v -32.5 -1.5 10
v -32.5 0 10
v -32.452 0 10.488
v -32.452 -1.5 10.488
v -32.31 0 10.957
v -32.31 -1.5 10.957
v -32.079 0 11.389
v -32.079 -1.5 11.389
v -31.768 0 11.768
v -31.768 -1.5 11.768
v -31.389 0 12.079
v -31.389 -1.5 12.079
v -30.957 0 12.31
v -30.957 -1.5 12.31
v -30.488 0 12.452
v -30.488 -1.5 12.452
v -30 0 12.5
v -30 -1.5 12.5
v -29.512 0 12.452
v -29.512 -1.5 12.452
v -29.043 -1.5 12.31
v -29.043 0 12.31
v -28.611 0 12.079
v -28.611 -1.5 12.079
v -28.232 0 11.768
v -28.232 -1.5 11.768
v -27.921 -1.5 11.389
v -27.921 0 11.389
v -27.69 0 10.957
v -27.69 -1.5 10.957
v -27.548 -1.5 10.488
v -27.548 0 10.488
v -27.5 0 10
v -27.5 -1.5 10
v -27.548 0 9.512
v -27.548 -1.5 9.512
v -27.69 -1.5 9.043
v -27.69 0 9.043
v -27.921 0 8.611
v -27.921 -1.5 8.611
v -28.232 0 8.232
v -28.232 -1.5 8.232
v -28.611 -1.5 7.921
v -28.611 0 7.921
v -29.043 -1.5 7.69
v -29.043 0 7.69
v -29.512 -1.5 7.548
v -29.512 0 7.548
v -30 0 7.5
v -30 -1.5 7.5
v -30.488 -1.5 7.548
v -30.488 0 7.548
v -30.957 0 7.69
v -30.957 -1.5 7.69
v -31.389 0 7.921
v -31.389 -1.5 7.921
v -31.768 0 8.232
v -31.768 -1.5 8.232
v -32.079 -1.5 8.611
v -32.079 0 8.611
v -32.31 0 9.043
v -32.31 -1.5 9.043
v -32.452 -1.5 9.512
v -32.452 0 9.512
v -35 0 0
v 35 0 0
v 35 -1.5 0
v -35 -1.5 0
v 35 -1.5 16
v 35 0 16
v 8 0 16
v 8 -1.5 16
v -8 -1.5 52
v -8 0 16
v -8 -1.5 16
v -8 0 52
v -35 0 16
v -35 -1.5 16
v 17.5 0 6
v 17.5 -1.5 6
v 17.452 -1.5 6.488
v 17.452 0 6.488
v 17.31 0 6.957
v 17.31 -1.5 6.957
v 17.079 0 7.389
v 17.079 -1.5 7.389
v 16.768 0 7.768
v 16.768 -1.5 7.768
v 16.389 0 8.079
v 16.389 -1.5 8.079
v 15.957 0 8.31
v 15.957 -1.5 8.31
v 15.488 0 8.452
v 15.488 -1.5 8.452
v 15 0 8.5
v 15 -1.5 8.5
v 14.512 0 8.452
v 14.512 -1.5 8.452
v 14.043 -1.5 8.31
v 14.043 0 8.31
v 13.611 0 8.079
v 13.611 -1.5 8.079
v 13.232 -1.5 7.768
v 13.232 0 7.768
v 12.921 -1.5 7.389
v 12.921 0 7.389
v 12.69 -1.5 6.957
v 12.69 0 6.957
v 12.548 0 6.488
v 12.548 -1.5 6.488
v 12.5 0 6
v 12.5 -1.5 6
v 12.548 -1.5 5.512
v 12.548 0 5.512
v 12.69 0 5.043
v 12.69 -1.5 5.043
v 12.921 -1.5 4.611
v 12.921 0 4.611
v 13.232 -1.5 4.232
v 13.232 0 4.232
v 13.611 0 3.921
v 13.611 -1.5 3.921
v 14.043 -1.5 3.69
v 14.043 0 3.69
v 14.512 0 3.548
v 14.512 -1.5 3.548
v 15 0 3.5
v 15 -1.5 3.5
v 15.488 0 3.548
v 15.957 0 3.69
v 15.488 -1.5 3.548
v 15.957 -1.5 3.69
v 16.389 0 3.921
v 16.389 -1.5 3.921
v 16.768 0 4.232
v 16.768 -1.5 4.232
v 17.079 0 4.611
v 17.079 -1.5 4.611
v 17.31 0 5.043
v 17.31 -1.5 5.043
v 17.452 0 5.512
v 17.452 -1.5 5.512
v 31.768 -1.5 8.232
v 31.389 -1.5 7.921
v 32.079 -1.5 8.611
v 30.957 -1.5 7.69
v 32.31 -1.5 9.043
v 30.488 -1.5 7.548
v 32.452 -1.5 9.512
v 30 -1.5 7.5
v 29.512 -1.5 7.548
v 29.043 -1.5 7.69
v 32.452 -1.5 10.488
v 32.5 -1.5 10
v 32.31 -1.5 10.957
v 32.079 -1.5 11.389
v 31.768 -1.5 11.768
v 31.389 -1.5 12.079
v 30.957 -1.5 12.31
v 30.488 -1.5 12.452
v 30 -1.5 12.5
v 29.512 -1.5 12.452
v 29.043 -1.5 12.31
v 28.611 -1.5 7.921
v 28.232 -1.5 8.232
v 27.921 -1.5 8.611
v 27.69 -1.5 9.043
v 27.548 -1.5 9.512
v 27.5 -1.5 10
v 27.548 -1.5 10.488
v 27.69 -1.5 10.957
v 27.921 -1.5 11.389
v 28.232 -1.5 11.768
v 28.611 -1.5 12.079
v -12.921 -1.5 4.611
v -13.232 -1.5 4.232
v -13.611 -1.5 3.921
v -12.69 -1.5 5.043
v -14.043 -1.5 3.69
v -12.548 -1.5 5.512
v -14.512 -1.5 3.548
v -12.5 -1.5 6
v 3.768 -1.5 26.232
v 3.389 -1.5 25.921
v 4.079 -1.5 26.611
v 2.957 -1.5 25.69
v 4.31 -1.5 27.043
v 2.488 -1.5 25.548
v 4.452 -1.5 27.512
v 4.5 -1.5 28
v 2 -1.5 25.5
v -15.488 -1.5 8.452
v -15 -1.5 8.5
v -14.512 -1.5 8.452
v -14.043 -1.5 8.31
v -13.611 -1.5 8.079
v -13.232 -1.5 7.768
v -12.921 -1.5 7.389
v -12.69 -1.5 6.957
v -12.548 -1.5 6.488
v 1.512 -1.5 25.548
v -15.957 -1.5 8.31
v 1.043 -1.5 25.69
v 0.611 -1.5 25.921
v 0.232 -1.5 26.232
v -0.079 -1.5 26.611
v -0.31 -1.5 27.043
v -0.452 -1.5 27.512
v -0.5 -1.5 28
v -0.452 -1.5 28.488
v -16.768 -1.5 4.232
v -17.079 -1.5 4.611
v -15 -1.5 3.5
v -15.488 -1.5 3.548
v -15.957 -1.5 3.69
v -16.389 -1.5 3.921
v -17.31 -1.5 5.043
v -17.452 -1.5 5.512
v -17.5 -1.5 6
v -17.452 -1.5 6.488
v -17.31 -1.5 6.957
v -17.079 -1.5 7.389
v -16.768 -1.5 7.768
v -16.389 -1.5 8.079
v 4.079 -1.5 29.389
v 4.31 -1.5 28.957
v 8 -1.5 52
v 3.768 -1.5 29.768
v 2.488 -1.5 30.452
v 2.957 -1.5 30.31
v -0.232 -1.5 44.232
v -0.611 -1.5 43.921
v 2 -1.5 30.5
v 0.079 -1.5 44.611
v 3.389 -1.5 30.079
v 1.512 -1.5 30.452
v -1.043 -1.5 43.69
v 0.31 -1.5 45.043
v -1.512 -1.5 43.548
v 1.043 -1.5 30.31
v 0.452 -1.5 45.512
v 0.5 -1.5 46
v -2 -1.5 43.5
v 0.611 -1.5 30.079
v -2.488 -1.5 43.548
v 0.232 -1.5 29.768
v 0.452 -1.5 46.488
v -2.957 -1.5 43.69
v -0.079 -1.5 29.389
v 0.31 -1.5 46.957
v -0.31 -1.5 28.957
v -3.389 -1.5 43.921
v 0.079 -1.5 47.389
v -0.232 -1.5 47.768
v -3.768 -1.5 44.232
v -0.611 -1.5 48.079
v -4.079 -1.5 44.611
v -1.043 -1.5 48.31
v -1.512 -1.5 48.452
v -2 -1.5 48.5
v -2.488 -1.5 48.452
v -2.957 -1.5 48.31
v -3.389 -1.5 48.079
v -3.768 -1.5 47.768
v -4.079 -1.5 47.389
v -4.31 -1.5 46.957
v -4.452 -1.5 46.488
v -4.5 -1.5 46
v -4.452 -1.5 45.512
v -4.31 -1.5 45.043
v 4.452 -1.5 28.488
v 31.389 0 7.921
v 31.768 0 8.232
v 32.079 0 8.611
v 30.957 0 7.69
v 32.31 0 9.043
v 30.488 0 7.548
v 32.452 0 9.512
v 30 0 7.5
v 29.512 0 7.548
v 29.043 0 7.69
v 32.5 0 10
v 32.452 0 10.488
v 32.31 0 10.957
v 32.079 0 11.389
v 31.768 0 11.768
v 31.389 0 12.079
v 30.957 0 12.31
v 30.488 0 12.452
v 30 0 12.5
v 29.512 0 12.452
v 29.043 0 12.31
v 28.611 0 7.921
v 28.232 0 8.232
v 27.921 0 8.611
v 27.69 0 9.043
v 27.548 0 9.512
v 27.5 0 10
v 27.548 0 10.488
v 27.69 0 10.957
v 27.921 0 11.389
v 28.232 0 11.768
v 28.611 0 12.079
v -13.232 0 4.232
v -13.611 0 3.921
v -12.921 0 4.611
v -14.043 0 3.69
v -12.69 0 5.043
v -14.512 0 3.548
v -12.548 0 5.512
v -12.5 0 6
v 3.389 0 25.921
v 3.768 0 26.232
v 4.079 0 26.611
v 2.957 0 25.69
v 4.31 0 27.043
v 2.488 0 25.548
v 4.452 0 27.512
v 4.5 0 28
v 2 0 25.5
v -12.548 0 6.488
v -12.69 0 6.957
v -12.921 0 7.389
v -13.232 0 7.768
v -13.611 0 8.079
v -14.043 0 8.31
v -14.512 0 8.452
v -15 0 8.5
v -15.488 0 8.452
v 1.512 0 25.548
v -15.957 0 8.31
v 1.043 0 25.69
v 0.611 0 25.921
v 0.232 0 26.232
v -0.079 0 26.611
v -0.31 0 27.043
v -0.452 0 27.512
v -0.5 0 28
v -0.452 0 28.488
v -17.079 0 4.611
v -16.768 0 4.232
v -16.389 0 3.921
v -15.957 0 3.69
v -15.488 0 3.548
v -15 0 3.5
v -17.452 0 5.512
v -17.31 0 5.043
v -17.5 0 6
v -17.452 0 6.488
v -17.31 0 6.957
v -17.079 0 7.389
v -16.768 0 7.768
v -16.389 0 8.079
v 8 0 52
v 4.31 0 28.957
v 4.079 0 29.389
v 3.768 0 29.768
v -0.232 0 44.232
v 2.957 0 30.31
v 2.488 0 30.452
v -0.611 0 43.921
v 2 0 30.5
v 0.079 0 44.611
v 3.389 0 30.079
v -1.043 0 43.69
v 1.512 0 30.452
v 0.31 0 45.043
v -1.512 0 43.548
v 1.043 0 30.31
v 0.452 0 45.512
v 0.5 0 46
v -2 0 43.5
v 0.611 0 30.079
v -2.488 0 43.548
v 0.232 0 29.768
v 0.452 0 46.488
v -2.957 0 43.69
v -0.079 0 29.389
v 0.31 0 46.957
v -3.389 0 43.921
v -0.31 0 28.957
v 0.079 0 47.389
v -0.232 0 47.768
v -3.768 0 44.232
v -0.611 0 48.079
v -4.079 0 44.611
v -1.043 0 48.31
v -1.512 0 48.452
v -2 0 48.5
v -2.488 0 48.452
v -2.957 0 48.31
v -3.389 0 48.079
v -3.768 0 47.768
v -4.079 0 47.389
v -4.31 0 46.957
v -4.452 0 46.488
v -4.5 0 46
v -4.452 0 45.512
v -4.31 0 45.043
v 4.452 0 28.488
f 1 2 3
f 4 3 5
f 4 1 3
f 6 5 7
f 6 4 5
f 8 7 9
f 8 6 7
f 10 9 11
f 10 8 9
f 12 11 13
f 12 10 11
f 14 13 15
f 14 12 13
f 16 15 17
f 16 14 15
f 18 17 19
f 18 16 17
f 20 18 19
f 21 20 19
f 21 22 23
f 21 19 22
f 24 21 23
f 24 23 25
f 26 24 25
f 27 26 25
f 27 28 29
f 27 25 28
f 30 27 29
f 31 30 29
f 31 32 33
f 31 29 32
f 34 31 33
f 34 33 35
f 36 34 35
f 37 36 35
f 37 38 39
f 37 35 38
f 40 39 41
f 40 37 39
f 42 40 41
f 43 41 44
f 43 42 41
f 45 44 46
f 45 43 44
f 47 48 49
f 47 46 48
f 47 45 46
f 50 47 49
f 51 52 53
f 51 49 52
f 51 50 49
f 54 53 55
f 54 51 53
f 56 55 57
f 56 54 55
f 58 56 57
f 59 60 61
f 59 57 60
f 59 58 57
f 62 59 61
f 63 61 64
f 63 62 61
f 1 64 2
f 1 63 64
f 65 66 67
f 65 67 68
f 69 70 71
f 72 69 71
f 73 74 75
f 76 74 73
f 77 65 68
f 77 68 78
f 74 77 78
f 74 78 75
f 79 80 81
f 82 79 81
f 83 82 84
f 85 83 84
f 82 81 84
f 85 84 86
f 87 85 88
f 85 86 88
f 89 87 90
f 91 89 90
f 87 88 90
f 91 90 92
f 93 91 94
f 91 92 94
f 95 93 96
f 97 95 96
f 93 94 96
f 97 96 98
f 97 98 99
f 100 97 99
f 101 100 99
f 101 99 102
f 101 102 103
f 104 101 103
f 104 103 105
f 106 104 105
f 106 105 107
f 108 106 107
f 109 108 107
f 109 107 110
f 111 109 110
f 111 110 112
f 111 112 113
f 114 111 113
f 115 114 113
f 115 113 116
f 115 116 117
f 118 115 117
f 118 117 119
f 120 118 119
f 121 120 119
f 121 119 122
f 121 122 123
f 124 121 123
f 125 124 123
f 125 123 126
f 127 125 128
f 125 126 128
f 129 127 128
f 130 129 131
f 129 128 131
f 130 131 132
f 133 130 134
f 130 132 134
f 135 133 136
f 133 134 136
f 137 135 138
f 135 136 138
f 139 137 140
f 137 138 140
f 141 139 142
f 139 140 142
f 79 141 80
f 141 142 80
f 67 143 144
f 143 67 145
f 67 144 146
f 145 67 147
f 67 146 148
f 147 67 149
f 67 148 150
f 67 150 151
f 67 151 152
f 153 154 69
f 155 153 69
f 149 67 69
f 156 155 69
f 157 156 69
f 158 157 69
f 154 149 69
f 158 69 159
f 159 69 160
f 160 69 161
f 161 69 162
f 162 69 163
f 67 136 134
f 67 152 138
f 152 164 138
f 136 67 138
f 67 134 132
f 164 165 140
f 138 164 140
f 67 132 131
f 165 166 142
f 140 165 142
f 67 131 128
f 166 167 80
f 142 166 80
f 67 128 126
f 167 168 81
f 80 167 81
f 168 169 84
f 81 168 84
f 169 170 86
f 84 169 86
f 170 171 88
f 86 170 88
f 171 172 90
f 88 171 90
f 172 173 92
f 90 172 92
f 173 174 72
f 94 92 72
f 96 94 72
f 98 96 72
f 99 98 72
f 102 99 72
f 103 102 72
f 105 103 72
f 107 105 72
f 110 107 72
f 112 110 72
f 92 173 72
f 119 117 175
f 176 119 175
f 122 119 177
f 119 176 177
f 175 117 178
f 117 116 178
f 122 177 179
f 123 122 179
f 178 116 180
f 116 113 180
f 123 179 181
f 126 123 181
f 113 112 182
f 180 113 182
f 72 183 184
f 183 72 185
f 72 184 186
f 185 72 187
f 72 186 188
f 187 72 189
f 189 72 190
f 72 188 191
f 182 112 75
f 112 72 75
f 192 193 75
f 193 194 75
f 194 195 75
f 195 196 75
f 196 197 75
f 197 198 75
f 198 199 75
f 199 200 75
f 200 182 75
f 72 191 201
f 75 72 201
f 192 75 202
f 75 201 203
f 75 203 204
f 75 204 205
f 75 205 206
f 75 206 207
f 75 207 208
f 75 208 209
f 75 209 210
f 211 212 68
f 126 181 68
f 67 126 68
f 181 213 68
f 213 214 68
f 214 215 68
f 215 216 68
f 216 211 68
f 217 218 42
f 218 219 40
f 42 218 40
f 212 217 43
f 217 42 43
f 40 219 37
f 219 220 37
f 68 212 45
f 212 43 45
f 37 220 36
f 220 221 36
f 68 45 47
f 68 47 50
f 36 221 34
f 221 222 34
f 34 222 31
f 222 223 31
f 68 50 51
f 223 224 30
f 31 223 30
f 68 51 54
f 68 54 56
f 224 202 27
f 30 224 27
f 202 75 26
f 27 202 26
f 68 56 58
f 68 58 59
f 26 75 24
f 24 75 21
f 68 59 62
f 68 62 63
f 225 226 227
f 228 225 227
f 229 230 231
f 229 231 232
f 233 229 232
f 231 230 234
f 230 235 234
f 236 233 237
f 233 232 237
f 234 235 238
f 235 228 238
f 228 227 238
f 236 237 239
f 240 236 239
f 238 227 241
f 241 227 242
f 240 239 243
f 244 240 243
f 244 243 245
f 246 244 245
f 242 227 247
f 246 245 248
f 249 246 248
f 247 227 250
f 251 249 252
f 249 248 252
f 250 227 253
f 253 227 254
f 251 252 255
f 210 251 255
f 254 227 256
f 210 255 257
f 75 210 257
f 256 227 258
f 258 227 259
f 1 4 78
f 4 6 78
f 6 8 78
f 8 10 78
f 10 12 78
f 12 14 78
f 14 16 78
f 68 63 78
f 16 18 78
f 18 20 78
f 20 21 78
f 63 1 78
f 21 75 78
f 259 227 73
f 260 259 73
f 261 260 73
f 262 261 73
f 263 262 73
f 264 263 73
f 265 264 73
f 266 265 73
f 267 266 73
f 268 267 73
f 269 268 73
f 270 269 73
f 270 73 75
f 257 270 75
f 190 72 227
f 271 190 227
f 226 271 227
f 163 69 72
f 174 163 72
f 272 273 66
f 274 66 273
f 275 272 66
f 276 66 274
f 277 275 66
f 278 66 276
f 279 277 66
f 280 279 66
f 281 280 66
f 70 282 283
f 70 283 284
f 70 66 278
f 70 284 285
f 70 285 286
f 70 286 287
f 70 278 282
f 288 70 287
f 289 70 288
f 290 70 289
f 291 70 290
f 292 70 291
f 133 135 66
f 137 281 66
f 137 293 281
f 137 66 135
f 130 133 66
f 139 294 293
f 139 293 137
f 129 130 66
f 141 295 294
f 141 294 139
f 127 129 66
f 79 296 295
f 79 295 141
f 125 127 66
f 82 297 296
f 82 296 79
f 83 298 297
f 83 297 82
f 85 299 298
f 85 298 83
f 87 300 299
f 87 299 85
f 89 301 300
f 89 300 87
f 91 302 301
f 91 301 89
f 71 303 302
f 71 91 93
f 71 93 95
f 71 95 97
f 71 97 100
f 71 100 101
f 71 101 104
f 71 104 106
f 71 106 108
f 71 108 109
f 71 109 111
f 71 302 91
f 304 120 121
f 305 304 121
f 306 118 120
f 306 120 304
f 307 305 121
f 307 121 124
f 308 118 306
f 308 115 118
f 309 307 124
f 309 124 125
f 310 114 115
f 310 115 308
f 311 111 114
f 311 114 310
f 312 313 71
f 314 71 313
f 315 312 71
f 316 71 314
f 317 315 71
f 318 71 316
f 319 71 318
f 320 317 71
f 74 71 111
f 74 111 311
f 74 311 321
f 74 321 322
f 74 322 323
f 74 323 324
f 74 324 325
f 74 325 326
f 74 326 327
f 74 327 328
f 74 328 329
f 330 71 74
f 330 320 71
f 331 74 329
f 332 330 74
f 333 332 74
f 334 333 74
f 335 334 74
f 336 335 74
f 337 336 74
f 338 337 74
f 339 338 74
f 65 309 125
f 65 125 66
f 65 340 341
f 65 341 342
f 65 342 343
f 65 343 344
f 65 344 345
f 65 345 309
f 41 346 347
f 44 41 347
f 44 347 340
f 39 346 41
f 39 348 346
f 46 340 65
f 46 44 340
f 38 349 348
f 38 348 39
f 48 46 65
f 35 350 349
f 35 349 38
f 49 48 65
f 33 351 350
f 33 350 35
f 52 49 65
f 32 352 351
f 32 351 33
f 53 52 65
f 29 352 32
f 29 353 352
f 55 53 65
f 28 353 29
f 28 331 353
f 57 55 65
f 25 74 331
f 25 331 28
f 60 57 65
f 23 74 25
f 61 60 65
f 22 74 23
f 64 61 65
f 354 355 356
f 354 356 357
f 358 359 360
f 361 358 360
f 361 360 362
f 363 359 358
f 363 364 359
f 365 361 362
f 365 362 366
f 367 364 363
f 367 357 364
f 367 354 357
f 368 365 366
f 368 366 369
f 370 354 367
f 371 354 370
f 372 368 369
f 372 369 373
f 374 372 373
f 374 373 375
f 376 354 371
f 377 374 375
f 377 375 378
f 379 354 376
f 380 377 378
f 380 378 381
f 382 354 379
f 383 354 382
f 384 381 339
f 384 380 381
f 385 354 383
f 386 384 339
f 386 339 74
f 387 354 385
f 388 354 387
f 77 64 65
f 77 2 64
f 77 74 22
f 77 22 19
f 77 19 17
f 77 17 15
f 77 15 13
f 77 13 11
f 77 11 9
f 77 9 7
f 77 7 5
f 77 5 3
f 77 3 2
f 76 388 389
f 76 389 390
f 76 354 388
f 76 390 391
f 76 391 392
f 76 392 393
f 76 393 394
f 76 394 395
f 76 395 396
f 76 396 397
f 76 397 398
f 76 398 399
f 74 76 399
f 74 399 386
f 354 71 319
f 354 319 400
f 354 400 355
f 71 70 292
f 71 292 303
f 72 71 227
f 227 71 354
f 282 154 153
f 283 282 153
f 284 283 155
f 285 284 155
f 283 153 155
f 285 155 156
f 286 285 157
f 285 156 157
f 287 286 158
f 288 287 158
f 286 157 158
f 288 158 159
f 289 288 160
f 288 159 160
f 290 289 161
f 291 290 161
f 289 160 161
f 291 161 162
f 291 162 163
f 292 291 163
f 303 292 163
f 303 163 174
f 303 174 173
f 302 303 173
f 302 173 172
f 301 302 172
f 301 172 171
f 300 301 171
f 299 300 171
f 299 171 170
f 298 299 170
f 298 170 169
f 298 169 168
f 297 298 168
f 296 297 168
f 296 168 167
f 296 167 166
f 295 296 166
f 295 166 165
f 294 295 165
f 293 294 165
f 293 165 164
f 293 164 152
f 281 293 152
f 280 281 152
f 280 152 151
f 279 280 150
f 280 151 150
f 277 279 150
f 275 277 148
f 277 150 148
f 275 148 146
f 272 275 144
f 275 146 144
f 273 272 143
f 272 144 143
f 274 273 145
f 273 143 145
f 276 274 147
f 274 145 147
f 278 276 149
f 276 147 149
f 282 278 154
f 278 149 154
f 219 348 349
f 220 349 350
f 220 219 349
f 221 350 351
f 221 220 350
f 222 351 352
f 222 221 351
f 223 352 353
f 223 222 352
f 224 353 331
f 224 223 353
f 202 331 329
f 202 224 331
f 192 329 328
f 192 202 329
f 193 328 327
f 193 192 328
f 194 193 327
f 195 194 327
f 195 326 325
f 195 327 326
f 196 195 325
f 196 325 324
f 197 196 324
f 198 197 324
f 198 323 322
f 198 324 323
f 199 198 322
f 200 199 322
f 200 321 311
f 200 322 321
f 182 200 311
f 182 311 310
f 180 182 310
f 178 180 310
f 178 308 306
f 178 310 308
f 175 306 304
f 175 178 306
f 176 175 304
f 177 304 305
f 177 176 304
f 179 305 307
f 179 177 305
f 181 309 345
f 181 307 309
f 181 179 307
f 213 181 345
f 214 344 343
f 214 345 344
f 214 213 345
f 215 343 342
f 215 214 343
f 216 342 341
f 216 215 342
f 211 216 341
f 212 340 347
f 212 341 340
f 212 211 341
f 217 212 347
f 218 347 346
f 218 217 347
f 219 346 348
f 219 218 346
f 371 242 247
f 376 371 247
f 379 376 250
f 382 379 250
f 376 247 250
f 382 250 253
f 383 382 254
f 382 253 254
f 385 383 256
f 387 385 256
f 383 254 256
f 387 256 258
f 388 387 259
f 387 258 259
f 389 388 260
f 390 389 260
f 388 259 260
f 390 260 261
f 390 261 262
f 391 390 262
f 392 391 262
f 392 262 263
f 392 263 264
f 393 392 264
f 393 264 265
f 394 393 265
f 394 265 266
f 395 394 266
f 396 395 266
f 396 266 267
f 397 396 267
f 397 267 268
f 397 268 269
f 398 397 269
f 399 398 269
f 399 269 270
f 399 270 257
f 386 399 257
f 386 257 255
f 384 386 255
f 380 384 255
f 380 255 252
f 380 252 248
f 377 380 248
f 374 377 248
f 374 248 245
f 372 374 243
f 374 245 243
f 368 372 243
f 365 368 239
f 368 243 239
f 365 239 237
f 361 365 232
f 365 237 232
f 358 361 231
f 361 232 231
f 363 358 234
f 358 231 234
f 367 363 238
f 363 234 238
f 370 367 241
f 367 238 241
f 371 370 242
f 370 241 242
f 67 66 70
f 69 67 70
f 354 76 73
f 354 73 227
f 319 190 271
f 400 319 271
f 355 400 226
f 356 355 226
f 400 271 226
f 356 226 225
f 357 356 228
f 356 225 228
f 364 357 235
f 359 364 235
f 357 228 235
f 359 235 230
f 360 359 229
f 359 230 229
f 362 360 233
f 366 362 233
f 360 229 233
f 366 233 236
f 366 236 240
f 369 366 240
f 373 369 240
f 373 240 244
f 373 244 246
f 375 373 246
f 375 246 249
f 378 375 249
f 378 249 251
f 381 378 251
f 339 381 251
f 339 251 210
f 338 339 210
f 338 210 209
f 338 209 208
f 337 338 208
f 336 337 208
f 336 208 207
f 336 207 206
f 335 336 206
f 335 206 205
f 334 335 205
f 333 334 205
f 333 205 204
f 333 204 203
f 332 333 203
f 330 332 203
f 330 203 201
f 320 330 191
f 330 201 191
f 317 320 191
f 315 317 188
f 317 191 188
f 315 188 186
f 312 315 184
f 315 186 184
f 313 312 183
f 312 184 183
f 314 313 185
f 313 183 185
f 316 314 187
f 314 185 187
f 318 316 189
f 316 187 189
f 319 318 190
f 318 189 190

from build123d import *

# Parameters (mm, degrees)
PAD_DEPTH       = 1.5
SKETCH001_R     = 2.5
POCKET_DEPTH    = 126.900362
SKETCH002_R     = 2.5
POCKET001_DEPTH = 1.501


with BuildPart() as part:
    # Sketch → Pad (new body)
    with BuildSketch(Plane.XZ):
        Polygon((0, 0), (35, 0), (35, 16), (8, 16), (8, 52), (0, 52), align=None)
    pad = extrude(amount=PAD_DEPTH)

    # Sketch001 (on Face8 of Pad) → Pocket (cut, through all)
    with BuildSketch(Plane.XZ.offset(1.5)):
        with Locations((30, 10)):
            Circle(SKETCH001_R)
        with Locations((15, 6)):
            Circle(SKETCH001_R)
    pocket = extrude(amount=-POCKET_DEPTH, mode=Mode.SUBTRACT)

    # Mirrored: Pad, Pocket across Sketch V_Axis
    add(pad.mirror(Plane(origin=(0, 0, 0), x_dir=(0, -1, 0), z_dir=(1, 0, 0))))
    add(pocket.mirror(Plane(origin=(0, 0, 0), x_dir=(0, -1, 0), z_dir=(1, 0, 0))), mode=Mode.SUBTRACT)

    # Sketch002 (on Face5 of Mirrored) → Pocket001 (cut, through all)
    with BuildSketch(Plane.XZ.offset(1.5)):
        with Locations((2, 28)):
            Circle(SKETCH002_R)
        with Locations((-2, 46)):
            Circle(SKETCH002_R)
    extrude(amount=-POCKET001_DEPTH, mode=Mode.SUBTRACT)


solid = part.part
